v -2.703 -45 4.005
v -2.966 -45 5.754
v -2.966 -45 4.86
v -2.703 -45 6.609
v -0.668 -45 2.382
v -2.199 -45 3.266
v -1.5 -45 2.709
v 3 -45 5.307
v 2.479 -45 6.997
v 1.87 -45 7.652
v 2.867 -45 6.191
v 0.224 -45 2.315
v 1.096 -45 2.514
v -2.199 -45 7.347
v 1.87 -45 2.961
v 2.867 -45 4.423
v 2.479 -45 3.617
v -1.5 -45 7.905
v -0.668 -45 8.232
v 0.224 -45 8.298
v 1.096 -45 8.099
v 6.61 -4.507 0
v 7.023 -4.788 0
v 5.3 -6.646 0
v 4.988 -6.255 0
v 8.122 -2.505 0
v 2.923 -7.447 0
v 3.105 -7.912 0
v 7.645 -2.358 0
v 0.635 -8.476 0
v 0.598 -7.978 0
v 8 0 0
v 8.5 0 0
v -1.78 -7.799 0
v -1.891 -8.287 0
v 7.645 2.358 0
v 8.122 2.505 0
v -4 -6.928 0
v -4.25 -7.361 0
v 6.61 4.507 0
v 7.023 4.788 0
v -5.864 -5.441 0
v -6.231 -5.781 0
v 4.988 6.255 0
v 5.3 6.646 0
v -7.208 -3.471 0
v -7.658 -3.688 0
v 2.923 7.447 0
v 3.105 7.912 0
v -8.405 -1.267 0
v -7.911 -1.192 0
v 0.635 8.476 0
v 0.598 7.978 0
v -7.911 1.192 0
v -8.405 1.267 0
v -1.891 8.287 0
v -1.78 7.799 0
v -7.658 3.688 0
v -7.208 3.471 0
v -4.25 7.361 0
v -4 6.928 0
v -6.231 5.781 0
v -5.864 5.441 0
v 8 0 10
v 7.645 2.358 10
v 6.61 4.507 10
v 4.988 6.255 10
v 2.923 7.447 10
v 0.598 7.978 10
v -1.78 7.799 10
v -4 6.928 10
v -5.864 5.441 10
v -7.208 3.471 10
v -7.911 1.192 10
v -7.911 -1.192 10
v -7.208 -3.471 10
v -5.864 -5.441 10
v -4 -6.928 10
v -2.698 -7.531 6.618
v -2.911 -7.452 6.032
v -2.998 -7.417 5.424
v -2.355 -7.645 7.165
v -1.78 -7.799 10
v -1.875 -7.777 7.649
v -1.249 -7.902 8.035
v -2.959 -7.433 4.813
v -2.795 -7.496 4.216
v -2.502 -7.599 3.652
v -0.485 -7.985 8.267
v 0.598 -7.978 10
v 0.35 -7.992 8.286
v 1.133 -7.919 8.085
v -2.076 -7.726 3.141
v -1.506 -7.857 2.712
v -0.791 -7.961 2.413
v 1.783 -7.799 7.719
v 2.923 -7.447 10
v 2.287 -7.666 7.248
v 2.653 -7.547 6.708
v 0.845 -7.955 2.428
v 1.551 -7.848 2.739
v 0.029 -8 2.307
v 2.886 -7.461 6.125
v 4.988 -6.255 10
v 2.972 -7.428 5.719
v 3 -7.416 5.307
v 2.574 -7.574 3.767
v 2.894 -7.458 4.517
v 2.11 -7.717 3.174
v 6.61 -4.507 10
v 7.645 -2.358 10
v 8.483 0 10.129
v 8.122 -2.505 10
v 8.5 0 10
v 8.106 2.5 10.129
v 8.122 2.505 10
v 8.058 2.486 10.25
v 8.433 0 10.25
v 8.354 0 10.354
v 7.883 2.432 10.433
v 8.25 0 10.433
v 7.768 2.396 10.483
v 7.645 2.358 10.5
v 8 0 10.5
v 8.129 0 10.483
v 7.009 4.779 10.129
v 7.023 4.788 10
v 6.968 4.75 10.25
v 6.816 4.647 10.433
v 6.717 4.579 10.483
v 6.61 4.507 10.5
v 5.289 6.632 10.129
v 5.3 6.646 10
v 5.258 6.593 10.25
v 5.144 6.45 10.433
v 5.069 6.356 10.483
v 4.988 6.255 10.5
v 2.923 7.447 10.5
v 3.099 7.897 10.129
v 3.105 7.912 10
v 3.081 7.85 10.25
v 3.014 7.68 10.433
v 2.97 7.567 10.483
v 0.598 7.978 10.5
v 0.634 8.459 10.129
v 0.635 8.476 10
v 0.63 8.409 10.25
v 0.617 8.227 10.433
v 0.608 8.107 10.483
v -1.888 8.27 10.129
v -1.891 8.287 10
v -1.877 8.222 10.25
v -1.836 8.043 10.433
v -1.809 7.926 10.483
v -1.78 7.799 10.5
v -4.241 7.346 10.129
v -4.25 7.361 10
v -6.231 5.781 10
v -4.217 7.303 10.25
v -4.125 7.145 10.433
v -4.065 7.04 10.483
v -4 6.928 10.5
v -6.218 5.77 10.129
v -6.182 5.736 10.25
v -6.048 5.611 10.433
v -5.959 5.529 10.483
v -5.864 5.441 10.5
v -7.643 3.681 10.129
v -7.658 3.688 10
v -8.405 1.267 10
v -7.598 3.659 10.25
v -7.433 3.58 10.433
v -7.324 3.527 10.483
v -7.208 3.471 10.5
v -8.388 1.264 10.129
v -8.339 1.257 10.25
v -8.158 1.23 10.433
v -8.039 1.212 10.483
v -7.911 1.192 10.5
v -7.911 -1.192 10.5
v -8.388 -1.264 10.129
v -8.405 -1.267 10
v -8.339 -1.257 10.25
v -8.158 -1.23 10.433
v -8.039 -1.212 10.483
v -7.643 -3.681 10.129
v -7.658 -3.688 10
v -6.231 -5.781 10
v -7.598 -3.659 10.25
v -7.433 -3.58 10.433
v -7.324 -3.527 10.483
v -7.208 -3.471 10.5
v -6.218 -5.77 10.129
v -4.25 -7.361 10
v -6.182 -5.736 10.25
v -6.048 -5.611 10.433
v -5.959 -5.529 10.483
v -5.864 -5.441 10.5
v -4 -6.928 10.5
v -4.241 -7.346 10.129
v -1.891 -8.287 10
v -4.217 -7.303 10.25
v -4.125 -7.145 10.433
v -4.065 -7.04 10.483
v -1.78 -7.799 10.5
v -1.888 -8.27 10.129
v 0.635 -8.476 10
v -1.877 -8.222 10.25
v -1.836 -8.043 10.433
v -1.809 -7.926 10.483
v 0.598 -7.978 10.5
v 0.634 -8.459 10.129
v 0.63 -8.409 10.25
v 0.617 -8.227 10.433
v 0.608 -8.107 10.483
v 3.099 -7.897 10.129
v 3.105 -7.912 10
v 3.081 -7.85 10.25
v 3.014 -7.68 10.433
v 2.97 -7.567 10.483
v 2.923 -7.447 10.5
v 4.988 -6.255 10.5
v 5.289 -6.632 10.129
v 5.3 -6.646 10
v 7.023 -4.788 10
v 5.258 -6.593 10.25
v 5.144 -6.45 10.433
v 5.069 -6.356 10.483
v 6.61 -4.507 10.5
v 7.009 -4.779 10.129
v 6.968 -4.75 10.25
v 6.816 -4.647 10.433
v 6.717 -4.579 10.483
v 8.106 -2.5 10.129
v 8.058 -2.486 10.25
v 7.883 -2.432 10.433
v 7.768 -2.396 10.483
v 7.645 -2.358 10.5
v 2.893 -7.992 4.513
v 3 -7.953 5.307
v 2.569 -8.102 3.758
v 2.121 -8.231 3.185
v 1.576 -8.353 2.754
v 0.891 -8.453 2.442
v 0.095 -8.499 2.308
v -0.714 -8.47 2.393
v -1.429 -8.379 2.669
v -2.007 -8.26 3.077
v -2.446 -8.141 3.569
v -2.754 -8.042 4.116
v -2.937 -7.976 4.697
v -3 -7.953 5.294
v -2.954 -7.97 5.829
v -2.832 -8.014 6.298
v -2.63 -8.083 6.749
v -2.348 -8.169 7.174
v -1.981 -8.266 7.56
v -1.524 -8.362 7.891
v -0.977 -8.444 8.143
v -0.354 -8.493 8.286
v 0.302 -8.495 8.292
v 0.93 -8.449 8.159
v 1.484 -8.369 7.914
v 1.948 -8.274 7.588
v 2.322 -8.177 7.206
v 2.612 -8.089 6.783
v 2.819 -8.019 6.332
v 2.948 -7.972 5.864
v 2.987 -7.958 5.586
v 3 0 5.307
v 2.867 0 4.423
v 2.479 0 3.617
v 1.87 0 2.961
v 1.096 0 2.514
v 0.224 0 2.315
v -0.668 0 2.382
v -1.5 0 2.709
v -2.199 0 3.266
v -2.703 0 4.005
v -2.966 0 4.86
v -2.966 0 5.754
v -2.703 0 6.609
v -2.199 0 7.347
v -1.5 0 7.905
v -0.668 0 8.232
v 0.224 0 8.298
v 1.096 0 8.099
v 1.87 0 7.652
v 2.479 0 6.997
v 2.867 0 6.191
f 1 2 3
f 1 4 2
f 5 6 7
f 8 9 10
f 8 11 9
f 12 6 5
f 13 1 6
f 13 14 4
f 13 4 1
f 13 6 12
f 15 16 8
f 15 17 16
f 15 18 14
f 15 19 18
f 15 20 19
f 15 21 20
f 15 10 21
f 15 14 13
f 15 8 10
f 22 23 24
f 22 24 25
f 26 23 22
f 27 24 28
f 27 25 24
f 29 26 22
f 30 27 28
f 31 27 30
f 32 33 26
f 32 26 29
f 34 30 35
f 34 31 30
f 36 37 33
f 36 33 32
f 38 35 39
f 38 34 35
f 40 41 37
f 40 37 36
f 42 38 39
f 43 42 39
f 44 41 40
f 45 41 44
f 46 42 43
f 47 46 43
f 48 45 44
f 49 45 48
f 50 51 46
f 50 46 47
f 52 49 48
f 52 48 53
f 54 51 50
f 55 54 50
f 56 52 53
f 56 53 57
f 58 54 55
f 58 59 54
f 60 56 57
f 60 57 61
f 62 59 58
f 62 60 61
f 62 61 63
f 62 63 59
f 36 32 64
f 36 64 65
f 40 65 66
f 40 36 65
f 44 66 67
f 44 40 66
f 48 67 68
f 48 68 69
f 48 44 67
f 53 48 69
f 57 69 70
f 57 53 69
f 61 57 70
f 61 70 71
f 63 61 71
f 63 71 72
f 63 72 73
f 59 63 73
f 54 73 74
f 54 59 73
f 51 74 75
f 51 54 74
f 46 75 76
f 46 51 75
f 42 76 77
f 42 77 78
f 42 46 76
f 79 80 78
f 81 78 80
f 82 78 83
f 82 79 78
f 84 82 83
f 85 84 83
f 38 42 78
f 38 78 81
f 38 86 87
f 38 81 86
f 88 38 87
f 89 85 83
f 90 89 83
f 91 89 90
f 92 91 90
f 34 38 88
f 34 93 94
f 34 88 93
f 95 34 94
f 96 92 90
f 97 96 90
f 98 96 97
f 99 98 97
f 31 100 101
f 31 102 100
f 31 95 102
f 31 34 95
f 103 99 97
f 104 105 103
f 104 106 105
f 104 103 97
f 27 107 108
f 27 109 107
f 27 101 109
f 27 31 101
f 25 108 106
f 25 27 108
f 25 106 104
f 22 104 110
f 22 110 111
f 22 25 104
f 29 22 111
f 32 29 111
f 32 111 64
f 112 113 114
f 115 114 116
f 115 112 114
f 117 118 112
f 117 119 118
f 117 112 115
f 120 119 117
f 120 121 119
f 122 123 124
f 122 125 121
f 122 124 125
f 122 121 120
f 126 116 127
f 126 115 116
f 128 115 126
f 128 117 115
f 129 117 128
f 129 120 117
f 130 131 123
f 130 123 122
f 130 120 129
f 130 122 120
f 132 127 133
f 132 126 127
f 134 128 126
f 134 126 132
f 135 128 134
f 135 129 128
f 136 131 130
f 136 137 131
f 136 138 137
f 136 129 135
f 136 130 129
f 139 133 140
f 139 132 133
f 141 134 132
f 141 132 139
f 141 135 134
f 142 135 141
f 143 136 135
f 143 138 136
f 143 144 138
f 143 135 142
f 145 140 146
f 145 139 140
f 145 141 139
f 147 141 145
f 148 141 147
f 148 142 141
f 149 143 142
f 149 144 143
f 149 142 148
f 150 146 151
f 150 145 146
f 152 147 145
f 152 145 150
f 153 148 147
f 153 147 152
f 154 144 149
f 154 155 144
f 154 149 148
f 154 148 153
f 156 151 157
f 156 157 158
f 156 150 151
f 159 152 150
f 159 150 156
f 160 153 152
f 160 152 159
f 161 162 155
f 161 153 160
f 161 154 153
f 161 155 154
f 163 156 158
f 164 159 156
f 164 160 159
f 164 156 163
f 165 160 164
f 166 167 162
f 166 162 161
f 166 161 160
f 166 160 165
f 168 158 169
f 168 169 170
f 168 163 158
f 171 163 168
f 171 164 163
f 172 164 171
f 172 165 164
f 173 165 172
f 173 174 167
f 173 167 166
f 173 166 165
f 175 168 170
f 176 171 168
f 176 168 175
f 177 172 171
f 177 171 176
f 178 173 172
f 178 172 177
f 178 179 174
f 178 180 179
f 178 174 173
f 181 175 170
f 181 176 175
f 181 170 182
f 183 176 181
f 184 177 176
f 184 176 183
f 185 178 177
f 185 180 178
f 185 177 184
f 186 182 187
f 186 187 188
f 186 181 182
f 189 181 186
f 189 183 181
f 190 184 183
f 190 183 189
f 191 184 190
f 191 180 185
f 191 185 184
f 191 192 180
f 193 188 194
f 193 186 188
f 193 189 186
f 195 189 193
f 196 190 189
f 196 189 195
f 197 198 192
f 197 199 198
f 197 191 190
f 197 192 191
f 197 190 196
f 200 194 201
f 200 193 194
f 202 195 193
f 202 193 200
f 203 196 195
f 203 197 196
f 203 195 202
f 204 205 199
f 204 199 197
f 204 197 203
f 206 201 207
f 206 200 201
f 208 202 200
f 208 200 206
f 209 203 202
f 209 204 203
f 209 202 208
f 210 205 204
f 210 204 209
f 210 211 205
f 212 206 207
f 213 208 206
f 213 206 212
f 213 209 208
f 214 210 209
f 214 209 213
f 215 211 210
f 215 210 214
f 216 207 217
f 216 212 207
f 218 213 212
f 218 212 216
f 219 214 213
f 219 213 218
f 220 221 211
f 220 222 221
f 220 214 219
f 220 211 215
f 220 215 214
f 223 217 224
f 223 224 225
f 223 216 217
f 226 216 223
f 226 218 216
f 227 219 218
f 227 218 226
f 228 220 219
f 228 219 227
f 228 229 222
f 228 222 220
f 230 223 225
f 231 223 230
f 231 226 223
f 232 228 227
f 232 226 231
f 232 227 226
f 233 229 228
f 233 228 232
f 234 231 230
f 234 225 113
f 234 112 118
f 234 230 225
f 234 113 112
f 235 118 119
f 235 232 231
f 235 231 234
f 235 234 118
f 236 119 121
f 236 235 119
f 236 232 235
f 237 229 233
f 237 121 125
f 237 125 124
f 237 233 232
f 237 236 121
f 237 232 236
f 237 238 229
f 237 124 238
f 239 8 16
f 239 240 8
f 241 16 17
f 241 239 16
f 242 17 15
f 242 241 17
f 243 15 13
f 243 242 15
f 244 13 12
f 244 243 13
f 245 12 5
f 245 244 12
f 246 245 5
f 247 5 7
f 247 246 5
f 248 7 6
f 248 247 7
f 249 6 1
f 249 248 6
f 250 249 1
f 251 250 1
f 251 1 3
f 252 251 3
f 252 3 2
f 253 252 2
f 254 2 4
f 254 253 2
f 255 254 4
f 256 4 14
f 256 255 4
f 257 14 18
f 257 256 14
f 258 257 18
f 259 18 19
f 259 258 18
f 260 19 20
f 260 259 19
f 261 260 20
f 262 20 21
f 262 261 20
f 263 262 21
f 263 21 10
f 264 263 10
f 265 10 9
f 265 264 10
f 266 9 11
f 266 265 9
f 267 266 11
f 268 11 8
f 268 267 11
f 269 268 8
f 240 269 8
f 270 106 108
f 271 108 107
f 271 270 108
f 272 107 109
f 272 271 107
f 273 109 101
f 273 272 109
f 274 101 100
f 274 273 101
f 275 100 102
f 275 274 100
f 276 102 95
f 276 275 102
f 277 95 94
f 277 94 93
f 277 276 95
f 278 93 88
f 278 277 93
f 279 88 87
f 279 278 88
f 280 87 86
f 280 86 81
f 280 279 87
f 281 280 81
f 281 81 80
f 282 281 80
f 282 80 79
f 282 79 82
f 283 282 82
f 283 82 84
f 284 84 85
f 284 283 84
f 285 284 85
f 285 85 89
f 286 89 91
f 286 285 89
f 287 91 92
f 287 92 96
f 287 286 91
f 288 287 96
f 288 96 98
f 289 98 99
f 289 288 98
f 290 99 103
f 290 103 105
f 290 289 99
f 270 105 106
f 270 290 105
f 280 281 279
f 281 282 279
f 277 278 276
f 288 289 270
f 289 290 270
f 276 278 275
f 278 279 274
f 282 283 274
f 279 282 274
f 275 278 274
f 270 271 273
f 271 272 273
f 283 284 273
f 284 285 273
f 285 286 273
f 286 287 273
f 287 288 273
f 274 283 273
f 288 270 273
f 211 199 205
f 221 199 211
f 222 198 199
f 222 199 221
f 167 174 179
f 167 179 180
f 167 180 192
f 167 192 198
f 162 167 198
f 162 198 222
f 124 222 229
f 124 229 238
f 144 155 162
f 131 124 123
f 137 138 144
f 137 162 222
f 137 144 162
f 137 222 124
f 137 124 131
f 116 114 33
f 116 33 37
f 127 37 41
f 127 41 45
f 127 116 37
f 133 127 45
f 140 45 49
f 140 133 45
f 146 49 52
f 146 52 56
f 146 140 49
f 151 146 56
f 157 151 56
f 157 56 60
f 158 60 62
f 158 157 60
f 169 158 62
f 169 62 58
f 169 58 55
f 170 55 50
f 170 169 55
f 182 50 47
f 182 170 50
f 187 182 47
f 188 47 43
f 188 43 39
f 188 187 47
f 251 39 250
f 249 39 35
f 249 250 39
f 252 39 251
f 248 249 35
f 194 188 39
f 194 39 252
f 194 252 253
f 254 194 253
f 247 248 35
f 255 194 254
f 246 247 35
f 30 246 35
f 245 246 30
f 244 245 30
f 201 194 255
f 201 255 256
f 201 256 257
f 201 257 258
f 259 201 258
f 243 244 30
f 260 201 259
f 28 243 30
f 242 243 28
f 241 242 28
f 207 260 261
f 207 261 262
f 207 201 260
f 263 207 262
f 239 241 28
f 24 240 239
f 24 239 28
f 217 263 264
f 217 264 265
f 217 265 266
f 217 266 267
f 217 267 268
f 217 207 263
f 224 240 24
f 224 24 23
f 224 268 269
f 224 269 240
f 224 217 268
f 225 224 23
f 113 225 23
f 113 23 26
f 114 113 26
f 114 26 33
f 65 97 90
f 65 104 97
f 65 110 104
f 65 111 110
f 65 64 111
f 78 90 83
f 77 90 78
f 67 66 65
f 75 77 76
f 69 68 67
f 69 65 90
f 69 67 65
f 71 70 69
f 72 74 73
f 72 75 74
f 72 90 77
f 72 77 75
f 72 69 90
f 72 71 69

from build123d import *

# Parameters (mm, degrees)
F4_R = 3


with BuildPart() as f2:
    # F1 (on Front) → F2 (revolve)
    with BuildSketch(Plane.XZ):
        with BuildLine():
            Line((8, 10), (8, 0))
            Line((8, 0), (8.5, 0))
            Line((8.5, 0), (8.5, 10))
            ThreePointArc((8.5, 10), (8.3535533906, 10.3535533906), (8, 10.5))
            Line((8, 10.5), (0, 10.5))
            Line((0, 10.5), (0, 10))
            Line((0, 10), (8, 10))
        make_face()
    revolve(axis=Axis((0, 0, 0), (0, 0, 1)))

    # F5: sweep along a path in F3
    with BuildLine(Plane.YZ) as f5_path:
        Line((-53, 5.2680876106), (-8, 5.2680876106))
    # F4 (on Front) → F5 (sweep)
    with BuildSketch(Plane.XZ):
        with Locations((0, 5.3068501875)):
            Circle(F4_R)
    sweep(path=f5_path.line)


solid = f2.part
